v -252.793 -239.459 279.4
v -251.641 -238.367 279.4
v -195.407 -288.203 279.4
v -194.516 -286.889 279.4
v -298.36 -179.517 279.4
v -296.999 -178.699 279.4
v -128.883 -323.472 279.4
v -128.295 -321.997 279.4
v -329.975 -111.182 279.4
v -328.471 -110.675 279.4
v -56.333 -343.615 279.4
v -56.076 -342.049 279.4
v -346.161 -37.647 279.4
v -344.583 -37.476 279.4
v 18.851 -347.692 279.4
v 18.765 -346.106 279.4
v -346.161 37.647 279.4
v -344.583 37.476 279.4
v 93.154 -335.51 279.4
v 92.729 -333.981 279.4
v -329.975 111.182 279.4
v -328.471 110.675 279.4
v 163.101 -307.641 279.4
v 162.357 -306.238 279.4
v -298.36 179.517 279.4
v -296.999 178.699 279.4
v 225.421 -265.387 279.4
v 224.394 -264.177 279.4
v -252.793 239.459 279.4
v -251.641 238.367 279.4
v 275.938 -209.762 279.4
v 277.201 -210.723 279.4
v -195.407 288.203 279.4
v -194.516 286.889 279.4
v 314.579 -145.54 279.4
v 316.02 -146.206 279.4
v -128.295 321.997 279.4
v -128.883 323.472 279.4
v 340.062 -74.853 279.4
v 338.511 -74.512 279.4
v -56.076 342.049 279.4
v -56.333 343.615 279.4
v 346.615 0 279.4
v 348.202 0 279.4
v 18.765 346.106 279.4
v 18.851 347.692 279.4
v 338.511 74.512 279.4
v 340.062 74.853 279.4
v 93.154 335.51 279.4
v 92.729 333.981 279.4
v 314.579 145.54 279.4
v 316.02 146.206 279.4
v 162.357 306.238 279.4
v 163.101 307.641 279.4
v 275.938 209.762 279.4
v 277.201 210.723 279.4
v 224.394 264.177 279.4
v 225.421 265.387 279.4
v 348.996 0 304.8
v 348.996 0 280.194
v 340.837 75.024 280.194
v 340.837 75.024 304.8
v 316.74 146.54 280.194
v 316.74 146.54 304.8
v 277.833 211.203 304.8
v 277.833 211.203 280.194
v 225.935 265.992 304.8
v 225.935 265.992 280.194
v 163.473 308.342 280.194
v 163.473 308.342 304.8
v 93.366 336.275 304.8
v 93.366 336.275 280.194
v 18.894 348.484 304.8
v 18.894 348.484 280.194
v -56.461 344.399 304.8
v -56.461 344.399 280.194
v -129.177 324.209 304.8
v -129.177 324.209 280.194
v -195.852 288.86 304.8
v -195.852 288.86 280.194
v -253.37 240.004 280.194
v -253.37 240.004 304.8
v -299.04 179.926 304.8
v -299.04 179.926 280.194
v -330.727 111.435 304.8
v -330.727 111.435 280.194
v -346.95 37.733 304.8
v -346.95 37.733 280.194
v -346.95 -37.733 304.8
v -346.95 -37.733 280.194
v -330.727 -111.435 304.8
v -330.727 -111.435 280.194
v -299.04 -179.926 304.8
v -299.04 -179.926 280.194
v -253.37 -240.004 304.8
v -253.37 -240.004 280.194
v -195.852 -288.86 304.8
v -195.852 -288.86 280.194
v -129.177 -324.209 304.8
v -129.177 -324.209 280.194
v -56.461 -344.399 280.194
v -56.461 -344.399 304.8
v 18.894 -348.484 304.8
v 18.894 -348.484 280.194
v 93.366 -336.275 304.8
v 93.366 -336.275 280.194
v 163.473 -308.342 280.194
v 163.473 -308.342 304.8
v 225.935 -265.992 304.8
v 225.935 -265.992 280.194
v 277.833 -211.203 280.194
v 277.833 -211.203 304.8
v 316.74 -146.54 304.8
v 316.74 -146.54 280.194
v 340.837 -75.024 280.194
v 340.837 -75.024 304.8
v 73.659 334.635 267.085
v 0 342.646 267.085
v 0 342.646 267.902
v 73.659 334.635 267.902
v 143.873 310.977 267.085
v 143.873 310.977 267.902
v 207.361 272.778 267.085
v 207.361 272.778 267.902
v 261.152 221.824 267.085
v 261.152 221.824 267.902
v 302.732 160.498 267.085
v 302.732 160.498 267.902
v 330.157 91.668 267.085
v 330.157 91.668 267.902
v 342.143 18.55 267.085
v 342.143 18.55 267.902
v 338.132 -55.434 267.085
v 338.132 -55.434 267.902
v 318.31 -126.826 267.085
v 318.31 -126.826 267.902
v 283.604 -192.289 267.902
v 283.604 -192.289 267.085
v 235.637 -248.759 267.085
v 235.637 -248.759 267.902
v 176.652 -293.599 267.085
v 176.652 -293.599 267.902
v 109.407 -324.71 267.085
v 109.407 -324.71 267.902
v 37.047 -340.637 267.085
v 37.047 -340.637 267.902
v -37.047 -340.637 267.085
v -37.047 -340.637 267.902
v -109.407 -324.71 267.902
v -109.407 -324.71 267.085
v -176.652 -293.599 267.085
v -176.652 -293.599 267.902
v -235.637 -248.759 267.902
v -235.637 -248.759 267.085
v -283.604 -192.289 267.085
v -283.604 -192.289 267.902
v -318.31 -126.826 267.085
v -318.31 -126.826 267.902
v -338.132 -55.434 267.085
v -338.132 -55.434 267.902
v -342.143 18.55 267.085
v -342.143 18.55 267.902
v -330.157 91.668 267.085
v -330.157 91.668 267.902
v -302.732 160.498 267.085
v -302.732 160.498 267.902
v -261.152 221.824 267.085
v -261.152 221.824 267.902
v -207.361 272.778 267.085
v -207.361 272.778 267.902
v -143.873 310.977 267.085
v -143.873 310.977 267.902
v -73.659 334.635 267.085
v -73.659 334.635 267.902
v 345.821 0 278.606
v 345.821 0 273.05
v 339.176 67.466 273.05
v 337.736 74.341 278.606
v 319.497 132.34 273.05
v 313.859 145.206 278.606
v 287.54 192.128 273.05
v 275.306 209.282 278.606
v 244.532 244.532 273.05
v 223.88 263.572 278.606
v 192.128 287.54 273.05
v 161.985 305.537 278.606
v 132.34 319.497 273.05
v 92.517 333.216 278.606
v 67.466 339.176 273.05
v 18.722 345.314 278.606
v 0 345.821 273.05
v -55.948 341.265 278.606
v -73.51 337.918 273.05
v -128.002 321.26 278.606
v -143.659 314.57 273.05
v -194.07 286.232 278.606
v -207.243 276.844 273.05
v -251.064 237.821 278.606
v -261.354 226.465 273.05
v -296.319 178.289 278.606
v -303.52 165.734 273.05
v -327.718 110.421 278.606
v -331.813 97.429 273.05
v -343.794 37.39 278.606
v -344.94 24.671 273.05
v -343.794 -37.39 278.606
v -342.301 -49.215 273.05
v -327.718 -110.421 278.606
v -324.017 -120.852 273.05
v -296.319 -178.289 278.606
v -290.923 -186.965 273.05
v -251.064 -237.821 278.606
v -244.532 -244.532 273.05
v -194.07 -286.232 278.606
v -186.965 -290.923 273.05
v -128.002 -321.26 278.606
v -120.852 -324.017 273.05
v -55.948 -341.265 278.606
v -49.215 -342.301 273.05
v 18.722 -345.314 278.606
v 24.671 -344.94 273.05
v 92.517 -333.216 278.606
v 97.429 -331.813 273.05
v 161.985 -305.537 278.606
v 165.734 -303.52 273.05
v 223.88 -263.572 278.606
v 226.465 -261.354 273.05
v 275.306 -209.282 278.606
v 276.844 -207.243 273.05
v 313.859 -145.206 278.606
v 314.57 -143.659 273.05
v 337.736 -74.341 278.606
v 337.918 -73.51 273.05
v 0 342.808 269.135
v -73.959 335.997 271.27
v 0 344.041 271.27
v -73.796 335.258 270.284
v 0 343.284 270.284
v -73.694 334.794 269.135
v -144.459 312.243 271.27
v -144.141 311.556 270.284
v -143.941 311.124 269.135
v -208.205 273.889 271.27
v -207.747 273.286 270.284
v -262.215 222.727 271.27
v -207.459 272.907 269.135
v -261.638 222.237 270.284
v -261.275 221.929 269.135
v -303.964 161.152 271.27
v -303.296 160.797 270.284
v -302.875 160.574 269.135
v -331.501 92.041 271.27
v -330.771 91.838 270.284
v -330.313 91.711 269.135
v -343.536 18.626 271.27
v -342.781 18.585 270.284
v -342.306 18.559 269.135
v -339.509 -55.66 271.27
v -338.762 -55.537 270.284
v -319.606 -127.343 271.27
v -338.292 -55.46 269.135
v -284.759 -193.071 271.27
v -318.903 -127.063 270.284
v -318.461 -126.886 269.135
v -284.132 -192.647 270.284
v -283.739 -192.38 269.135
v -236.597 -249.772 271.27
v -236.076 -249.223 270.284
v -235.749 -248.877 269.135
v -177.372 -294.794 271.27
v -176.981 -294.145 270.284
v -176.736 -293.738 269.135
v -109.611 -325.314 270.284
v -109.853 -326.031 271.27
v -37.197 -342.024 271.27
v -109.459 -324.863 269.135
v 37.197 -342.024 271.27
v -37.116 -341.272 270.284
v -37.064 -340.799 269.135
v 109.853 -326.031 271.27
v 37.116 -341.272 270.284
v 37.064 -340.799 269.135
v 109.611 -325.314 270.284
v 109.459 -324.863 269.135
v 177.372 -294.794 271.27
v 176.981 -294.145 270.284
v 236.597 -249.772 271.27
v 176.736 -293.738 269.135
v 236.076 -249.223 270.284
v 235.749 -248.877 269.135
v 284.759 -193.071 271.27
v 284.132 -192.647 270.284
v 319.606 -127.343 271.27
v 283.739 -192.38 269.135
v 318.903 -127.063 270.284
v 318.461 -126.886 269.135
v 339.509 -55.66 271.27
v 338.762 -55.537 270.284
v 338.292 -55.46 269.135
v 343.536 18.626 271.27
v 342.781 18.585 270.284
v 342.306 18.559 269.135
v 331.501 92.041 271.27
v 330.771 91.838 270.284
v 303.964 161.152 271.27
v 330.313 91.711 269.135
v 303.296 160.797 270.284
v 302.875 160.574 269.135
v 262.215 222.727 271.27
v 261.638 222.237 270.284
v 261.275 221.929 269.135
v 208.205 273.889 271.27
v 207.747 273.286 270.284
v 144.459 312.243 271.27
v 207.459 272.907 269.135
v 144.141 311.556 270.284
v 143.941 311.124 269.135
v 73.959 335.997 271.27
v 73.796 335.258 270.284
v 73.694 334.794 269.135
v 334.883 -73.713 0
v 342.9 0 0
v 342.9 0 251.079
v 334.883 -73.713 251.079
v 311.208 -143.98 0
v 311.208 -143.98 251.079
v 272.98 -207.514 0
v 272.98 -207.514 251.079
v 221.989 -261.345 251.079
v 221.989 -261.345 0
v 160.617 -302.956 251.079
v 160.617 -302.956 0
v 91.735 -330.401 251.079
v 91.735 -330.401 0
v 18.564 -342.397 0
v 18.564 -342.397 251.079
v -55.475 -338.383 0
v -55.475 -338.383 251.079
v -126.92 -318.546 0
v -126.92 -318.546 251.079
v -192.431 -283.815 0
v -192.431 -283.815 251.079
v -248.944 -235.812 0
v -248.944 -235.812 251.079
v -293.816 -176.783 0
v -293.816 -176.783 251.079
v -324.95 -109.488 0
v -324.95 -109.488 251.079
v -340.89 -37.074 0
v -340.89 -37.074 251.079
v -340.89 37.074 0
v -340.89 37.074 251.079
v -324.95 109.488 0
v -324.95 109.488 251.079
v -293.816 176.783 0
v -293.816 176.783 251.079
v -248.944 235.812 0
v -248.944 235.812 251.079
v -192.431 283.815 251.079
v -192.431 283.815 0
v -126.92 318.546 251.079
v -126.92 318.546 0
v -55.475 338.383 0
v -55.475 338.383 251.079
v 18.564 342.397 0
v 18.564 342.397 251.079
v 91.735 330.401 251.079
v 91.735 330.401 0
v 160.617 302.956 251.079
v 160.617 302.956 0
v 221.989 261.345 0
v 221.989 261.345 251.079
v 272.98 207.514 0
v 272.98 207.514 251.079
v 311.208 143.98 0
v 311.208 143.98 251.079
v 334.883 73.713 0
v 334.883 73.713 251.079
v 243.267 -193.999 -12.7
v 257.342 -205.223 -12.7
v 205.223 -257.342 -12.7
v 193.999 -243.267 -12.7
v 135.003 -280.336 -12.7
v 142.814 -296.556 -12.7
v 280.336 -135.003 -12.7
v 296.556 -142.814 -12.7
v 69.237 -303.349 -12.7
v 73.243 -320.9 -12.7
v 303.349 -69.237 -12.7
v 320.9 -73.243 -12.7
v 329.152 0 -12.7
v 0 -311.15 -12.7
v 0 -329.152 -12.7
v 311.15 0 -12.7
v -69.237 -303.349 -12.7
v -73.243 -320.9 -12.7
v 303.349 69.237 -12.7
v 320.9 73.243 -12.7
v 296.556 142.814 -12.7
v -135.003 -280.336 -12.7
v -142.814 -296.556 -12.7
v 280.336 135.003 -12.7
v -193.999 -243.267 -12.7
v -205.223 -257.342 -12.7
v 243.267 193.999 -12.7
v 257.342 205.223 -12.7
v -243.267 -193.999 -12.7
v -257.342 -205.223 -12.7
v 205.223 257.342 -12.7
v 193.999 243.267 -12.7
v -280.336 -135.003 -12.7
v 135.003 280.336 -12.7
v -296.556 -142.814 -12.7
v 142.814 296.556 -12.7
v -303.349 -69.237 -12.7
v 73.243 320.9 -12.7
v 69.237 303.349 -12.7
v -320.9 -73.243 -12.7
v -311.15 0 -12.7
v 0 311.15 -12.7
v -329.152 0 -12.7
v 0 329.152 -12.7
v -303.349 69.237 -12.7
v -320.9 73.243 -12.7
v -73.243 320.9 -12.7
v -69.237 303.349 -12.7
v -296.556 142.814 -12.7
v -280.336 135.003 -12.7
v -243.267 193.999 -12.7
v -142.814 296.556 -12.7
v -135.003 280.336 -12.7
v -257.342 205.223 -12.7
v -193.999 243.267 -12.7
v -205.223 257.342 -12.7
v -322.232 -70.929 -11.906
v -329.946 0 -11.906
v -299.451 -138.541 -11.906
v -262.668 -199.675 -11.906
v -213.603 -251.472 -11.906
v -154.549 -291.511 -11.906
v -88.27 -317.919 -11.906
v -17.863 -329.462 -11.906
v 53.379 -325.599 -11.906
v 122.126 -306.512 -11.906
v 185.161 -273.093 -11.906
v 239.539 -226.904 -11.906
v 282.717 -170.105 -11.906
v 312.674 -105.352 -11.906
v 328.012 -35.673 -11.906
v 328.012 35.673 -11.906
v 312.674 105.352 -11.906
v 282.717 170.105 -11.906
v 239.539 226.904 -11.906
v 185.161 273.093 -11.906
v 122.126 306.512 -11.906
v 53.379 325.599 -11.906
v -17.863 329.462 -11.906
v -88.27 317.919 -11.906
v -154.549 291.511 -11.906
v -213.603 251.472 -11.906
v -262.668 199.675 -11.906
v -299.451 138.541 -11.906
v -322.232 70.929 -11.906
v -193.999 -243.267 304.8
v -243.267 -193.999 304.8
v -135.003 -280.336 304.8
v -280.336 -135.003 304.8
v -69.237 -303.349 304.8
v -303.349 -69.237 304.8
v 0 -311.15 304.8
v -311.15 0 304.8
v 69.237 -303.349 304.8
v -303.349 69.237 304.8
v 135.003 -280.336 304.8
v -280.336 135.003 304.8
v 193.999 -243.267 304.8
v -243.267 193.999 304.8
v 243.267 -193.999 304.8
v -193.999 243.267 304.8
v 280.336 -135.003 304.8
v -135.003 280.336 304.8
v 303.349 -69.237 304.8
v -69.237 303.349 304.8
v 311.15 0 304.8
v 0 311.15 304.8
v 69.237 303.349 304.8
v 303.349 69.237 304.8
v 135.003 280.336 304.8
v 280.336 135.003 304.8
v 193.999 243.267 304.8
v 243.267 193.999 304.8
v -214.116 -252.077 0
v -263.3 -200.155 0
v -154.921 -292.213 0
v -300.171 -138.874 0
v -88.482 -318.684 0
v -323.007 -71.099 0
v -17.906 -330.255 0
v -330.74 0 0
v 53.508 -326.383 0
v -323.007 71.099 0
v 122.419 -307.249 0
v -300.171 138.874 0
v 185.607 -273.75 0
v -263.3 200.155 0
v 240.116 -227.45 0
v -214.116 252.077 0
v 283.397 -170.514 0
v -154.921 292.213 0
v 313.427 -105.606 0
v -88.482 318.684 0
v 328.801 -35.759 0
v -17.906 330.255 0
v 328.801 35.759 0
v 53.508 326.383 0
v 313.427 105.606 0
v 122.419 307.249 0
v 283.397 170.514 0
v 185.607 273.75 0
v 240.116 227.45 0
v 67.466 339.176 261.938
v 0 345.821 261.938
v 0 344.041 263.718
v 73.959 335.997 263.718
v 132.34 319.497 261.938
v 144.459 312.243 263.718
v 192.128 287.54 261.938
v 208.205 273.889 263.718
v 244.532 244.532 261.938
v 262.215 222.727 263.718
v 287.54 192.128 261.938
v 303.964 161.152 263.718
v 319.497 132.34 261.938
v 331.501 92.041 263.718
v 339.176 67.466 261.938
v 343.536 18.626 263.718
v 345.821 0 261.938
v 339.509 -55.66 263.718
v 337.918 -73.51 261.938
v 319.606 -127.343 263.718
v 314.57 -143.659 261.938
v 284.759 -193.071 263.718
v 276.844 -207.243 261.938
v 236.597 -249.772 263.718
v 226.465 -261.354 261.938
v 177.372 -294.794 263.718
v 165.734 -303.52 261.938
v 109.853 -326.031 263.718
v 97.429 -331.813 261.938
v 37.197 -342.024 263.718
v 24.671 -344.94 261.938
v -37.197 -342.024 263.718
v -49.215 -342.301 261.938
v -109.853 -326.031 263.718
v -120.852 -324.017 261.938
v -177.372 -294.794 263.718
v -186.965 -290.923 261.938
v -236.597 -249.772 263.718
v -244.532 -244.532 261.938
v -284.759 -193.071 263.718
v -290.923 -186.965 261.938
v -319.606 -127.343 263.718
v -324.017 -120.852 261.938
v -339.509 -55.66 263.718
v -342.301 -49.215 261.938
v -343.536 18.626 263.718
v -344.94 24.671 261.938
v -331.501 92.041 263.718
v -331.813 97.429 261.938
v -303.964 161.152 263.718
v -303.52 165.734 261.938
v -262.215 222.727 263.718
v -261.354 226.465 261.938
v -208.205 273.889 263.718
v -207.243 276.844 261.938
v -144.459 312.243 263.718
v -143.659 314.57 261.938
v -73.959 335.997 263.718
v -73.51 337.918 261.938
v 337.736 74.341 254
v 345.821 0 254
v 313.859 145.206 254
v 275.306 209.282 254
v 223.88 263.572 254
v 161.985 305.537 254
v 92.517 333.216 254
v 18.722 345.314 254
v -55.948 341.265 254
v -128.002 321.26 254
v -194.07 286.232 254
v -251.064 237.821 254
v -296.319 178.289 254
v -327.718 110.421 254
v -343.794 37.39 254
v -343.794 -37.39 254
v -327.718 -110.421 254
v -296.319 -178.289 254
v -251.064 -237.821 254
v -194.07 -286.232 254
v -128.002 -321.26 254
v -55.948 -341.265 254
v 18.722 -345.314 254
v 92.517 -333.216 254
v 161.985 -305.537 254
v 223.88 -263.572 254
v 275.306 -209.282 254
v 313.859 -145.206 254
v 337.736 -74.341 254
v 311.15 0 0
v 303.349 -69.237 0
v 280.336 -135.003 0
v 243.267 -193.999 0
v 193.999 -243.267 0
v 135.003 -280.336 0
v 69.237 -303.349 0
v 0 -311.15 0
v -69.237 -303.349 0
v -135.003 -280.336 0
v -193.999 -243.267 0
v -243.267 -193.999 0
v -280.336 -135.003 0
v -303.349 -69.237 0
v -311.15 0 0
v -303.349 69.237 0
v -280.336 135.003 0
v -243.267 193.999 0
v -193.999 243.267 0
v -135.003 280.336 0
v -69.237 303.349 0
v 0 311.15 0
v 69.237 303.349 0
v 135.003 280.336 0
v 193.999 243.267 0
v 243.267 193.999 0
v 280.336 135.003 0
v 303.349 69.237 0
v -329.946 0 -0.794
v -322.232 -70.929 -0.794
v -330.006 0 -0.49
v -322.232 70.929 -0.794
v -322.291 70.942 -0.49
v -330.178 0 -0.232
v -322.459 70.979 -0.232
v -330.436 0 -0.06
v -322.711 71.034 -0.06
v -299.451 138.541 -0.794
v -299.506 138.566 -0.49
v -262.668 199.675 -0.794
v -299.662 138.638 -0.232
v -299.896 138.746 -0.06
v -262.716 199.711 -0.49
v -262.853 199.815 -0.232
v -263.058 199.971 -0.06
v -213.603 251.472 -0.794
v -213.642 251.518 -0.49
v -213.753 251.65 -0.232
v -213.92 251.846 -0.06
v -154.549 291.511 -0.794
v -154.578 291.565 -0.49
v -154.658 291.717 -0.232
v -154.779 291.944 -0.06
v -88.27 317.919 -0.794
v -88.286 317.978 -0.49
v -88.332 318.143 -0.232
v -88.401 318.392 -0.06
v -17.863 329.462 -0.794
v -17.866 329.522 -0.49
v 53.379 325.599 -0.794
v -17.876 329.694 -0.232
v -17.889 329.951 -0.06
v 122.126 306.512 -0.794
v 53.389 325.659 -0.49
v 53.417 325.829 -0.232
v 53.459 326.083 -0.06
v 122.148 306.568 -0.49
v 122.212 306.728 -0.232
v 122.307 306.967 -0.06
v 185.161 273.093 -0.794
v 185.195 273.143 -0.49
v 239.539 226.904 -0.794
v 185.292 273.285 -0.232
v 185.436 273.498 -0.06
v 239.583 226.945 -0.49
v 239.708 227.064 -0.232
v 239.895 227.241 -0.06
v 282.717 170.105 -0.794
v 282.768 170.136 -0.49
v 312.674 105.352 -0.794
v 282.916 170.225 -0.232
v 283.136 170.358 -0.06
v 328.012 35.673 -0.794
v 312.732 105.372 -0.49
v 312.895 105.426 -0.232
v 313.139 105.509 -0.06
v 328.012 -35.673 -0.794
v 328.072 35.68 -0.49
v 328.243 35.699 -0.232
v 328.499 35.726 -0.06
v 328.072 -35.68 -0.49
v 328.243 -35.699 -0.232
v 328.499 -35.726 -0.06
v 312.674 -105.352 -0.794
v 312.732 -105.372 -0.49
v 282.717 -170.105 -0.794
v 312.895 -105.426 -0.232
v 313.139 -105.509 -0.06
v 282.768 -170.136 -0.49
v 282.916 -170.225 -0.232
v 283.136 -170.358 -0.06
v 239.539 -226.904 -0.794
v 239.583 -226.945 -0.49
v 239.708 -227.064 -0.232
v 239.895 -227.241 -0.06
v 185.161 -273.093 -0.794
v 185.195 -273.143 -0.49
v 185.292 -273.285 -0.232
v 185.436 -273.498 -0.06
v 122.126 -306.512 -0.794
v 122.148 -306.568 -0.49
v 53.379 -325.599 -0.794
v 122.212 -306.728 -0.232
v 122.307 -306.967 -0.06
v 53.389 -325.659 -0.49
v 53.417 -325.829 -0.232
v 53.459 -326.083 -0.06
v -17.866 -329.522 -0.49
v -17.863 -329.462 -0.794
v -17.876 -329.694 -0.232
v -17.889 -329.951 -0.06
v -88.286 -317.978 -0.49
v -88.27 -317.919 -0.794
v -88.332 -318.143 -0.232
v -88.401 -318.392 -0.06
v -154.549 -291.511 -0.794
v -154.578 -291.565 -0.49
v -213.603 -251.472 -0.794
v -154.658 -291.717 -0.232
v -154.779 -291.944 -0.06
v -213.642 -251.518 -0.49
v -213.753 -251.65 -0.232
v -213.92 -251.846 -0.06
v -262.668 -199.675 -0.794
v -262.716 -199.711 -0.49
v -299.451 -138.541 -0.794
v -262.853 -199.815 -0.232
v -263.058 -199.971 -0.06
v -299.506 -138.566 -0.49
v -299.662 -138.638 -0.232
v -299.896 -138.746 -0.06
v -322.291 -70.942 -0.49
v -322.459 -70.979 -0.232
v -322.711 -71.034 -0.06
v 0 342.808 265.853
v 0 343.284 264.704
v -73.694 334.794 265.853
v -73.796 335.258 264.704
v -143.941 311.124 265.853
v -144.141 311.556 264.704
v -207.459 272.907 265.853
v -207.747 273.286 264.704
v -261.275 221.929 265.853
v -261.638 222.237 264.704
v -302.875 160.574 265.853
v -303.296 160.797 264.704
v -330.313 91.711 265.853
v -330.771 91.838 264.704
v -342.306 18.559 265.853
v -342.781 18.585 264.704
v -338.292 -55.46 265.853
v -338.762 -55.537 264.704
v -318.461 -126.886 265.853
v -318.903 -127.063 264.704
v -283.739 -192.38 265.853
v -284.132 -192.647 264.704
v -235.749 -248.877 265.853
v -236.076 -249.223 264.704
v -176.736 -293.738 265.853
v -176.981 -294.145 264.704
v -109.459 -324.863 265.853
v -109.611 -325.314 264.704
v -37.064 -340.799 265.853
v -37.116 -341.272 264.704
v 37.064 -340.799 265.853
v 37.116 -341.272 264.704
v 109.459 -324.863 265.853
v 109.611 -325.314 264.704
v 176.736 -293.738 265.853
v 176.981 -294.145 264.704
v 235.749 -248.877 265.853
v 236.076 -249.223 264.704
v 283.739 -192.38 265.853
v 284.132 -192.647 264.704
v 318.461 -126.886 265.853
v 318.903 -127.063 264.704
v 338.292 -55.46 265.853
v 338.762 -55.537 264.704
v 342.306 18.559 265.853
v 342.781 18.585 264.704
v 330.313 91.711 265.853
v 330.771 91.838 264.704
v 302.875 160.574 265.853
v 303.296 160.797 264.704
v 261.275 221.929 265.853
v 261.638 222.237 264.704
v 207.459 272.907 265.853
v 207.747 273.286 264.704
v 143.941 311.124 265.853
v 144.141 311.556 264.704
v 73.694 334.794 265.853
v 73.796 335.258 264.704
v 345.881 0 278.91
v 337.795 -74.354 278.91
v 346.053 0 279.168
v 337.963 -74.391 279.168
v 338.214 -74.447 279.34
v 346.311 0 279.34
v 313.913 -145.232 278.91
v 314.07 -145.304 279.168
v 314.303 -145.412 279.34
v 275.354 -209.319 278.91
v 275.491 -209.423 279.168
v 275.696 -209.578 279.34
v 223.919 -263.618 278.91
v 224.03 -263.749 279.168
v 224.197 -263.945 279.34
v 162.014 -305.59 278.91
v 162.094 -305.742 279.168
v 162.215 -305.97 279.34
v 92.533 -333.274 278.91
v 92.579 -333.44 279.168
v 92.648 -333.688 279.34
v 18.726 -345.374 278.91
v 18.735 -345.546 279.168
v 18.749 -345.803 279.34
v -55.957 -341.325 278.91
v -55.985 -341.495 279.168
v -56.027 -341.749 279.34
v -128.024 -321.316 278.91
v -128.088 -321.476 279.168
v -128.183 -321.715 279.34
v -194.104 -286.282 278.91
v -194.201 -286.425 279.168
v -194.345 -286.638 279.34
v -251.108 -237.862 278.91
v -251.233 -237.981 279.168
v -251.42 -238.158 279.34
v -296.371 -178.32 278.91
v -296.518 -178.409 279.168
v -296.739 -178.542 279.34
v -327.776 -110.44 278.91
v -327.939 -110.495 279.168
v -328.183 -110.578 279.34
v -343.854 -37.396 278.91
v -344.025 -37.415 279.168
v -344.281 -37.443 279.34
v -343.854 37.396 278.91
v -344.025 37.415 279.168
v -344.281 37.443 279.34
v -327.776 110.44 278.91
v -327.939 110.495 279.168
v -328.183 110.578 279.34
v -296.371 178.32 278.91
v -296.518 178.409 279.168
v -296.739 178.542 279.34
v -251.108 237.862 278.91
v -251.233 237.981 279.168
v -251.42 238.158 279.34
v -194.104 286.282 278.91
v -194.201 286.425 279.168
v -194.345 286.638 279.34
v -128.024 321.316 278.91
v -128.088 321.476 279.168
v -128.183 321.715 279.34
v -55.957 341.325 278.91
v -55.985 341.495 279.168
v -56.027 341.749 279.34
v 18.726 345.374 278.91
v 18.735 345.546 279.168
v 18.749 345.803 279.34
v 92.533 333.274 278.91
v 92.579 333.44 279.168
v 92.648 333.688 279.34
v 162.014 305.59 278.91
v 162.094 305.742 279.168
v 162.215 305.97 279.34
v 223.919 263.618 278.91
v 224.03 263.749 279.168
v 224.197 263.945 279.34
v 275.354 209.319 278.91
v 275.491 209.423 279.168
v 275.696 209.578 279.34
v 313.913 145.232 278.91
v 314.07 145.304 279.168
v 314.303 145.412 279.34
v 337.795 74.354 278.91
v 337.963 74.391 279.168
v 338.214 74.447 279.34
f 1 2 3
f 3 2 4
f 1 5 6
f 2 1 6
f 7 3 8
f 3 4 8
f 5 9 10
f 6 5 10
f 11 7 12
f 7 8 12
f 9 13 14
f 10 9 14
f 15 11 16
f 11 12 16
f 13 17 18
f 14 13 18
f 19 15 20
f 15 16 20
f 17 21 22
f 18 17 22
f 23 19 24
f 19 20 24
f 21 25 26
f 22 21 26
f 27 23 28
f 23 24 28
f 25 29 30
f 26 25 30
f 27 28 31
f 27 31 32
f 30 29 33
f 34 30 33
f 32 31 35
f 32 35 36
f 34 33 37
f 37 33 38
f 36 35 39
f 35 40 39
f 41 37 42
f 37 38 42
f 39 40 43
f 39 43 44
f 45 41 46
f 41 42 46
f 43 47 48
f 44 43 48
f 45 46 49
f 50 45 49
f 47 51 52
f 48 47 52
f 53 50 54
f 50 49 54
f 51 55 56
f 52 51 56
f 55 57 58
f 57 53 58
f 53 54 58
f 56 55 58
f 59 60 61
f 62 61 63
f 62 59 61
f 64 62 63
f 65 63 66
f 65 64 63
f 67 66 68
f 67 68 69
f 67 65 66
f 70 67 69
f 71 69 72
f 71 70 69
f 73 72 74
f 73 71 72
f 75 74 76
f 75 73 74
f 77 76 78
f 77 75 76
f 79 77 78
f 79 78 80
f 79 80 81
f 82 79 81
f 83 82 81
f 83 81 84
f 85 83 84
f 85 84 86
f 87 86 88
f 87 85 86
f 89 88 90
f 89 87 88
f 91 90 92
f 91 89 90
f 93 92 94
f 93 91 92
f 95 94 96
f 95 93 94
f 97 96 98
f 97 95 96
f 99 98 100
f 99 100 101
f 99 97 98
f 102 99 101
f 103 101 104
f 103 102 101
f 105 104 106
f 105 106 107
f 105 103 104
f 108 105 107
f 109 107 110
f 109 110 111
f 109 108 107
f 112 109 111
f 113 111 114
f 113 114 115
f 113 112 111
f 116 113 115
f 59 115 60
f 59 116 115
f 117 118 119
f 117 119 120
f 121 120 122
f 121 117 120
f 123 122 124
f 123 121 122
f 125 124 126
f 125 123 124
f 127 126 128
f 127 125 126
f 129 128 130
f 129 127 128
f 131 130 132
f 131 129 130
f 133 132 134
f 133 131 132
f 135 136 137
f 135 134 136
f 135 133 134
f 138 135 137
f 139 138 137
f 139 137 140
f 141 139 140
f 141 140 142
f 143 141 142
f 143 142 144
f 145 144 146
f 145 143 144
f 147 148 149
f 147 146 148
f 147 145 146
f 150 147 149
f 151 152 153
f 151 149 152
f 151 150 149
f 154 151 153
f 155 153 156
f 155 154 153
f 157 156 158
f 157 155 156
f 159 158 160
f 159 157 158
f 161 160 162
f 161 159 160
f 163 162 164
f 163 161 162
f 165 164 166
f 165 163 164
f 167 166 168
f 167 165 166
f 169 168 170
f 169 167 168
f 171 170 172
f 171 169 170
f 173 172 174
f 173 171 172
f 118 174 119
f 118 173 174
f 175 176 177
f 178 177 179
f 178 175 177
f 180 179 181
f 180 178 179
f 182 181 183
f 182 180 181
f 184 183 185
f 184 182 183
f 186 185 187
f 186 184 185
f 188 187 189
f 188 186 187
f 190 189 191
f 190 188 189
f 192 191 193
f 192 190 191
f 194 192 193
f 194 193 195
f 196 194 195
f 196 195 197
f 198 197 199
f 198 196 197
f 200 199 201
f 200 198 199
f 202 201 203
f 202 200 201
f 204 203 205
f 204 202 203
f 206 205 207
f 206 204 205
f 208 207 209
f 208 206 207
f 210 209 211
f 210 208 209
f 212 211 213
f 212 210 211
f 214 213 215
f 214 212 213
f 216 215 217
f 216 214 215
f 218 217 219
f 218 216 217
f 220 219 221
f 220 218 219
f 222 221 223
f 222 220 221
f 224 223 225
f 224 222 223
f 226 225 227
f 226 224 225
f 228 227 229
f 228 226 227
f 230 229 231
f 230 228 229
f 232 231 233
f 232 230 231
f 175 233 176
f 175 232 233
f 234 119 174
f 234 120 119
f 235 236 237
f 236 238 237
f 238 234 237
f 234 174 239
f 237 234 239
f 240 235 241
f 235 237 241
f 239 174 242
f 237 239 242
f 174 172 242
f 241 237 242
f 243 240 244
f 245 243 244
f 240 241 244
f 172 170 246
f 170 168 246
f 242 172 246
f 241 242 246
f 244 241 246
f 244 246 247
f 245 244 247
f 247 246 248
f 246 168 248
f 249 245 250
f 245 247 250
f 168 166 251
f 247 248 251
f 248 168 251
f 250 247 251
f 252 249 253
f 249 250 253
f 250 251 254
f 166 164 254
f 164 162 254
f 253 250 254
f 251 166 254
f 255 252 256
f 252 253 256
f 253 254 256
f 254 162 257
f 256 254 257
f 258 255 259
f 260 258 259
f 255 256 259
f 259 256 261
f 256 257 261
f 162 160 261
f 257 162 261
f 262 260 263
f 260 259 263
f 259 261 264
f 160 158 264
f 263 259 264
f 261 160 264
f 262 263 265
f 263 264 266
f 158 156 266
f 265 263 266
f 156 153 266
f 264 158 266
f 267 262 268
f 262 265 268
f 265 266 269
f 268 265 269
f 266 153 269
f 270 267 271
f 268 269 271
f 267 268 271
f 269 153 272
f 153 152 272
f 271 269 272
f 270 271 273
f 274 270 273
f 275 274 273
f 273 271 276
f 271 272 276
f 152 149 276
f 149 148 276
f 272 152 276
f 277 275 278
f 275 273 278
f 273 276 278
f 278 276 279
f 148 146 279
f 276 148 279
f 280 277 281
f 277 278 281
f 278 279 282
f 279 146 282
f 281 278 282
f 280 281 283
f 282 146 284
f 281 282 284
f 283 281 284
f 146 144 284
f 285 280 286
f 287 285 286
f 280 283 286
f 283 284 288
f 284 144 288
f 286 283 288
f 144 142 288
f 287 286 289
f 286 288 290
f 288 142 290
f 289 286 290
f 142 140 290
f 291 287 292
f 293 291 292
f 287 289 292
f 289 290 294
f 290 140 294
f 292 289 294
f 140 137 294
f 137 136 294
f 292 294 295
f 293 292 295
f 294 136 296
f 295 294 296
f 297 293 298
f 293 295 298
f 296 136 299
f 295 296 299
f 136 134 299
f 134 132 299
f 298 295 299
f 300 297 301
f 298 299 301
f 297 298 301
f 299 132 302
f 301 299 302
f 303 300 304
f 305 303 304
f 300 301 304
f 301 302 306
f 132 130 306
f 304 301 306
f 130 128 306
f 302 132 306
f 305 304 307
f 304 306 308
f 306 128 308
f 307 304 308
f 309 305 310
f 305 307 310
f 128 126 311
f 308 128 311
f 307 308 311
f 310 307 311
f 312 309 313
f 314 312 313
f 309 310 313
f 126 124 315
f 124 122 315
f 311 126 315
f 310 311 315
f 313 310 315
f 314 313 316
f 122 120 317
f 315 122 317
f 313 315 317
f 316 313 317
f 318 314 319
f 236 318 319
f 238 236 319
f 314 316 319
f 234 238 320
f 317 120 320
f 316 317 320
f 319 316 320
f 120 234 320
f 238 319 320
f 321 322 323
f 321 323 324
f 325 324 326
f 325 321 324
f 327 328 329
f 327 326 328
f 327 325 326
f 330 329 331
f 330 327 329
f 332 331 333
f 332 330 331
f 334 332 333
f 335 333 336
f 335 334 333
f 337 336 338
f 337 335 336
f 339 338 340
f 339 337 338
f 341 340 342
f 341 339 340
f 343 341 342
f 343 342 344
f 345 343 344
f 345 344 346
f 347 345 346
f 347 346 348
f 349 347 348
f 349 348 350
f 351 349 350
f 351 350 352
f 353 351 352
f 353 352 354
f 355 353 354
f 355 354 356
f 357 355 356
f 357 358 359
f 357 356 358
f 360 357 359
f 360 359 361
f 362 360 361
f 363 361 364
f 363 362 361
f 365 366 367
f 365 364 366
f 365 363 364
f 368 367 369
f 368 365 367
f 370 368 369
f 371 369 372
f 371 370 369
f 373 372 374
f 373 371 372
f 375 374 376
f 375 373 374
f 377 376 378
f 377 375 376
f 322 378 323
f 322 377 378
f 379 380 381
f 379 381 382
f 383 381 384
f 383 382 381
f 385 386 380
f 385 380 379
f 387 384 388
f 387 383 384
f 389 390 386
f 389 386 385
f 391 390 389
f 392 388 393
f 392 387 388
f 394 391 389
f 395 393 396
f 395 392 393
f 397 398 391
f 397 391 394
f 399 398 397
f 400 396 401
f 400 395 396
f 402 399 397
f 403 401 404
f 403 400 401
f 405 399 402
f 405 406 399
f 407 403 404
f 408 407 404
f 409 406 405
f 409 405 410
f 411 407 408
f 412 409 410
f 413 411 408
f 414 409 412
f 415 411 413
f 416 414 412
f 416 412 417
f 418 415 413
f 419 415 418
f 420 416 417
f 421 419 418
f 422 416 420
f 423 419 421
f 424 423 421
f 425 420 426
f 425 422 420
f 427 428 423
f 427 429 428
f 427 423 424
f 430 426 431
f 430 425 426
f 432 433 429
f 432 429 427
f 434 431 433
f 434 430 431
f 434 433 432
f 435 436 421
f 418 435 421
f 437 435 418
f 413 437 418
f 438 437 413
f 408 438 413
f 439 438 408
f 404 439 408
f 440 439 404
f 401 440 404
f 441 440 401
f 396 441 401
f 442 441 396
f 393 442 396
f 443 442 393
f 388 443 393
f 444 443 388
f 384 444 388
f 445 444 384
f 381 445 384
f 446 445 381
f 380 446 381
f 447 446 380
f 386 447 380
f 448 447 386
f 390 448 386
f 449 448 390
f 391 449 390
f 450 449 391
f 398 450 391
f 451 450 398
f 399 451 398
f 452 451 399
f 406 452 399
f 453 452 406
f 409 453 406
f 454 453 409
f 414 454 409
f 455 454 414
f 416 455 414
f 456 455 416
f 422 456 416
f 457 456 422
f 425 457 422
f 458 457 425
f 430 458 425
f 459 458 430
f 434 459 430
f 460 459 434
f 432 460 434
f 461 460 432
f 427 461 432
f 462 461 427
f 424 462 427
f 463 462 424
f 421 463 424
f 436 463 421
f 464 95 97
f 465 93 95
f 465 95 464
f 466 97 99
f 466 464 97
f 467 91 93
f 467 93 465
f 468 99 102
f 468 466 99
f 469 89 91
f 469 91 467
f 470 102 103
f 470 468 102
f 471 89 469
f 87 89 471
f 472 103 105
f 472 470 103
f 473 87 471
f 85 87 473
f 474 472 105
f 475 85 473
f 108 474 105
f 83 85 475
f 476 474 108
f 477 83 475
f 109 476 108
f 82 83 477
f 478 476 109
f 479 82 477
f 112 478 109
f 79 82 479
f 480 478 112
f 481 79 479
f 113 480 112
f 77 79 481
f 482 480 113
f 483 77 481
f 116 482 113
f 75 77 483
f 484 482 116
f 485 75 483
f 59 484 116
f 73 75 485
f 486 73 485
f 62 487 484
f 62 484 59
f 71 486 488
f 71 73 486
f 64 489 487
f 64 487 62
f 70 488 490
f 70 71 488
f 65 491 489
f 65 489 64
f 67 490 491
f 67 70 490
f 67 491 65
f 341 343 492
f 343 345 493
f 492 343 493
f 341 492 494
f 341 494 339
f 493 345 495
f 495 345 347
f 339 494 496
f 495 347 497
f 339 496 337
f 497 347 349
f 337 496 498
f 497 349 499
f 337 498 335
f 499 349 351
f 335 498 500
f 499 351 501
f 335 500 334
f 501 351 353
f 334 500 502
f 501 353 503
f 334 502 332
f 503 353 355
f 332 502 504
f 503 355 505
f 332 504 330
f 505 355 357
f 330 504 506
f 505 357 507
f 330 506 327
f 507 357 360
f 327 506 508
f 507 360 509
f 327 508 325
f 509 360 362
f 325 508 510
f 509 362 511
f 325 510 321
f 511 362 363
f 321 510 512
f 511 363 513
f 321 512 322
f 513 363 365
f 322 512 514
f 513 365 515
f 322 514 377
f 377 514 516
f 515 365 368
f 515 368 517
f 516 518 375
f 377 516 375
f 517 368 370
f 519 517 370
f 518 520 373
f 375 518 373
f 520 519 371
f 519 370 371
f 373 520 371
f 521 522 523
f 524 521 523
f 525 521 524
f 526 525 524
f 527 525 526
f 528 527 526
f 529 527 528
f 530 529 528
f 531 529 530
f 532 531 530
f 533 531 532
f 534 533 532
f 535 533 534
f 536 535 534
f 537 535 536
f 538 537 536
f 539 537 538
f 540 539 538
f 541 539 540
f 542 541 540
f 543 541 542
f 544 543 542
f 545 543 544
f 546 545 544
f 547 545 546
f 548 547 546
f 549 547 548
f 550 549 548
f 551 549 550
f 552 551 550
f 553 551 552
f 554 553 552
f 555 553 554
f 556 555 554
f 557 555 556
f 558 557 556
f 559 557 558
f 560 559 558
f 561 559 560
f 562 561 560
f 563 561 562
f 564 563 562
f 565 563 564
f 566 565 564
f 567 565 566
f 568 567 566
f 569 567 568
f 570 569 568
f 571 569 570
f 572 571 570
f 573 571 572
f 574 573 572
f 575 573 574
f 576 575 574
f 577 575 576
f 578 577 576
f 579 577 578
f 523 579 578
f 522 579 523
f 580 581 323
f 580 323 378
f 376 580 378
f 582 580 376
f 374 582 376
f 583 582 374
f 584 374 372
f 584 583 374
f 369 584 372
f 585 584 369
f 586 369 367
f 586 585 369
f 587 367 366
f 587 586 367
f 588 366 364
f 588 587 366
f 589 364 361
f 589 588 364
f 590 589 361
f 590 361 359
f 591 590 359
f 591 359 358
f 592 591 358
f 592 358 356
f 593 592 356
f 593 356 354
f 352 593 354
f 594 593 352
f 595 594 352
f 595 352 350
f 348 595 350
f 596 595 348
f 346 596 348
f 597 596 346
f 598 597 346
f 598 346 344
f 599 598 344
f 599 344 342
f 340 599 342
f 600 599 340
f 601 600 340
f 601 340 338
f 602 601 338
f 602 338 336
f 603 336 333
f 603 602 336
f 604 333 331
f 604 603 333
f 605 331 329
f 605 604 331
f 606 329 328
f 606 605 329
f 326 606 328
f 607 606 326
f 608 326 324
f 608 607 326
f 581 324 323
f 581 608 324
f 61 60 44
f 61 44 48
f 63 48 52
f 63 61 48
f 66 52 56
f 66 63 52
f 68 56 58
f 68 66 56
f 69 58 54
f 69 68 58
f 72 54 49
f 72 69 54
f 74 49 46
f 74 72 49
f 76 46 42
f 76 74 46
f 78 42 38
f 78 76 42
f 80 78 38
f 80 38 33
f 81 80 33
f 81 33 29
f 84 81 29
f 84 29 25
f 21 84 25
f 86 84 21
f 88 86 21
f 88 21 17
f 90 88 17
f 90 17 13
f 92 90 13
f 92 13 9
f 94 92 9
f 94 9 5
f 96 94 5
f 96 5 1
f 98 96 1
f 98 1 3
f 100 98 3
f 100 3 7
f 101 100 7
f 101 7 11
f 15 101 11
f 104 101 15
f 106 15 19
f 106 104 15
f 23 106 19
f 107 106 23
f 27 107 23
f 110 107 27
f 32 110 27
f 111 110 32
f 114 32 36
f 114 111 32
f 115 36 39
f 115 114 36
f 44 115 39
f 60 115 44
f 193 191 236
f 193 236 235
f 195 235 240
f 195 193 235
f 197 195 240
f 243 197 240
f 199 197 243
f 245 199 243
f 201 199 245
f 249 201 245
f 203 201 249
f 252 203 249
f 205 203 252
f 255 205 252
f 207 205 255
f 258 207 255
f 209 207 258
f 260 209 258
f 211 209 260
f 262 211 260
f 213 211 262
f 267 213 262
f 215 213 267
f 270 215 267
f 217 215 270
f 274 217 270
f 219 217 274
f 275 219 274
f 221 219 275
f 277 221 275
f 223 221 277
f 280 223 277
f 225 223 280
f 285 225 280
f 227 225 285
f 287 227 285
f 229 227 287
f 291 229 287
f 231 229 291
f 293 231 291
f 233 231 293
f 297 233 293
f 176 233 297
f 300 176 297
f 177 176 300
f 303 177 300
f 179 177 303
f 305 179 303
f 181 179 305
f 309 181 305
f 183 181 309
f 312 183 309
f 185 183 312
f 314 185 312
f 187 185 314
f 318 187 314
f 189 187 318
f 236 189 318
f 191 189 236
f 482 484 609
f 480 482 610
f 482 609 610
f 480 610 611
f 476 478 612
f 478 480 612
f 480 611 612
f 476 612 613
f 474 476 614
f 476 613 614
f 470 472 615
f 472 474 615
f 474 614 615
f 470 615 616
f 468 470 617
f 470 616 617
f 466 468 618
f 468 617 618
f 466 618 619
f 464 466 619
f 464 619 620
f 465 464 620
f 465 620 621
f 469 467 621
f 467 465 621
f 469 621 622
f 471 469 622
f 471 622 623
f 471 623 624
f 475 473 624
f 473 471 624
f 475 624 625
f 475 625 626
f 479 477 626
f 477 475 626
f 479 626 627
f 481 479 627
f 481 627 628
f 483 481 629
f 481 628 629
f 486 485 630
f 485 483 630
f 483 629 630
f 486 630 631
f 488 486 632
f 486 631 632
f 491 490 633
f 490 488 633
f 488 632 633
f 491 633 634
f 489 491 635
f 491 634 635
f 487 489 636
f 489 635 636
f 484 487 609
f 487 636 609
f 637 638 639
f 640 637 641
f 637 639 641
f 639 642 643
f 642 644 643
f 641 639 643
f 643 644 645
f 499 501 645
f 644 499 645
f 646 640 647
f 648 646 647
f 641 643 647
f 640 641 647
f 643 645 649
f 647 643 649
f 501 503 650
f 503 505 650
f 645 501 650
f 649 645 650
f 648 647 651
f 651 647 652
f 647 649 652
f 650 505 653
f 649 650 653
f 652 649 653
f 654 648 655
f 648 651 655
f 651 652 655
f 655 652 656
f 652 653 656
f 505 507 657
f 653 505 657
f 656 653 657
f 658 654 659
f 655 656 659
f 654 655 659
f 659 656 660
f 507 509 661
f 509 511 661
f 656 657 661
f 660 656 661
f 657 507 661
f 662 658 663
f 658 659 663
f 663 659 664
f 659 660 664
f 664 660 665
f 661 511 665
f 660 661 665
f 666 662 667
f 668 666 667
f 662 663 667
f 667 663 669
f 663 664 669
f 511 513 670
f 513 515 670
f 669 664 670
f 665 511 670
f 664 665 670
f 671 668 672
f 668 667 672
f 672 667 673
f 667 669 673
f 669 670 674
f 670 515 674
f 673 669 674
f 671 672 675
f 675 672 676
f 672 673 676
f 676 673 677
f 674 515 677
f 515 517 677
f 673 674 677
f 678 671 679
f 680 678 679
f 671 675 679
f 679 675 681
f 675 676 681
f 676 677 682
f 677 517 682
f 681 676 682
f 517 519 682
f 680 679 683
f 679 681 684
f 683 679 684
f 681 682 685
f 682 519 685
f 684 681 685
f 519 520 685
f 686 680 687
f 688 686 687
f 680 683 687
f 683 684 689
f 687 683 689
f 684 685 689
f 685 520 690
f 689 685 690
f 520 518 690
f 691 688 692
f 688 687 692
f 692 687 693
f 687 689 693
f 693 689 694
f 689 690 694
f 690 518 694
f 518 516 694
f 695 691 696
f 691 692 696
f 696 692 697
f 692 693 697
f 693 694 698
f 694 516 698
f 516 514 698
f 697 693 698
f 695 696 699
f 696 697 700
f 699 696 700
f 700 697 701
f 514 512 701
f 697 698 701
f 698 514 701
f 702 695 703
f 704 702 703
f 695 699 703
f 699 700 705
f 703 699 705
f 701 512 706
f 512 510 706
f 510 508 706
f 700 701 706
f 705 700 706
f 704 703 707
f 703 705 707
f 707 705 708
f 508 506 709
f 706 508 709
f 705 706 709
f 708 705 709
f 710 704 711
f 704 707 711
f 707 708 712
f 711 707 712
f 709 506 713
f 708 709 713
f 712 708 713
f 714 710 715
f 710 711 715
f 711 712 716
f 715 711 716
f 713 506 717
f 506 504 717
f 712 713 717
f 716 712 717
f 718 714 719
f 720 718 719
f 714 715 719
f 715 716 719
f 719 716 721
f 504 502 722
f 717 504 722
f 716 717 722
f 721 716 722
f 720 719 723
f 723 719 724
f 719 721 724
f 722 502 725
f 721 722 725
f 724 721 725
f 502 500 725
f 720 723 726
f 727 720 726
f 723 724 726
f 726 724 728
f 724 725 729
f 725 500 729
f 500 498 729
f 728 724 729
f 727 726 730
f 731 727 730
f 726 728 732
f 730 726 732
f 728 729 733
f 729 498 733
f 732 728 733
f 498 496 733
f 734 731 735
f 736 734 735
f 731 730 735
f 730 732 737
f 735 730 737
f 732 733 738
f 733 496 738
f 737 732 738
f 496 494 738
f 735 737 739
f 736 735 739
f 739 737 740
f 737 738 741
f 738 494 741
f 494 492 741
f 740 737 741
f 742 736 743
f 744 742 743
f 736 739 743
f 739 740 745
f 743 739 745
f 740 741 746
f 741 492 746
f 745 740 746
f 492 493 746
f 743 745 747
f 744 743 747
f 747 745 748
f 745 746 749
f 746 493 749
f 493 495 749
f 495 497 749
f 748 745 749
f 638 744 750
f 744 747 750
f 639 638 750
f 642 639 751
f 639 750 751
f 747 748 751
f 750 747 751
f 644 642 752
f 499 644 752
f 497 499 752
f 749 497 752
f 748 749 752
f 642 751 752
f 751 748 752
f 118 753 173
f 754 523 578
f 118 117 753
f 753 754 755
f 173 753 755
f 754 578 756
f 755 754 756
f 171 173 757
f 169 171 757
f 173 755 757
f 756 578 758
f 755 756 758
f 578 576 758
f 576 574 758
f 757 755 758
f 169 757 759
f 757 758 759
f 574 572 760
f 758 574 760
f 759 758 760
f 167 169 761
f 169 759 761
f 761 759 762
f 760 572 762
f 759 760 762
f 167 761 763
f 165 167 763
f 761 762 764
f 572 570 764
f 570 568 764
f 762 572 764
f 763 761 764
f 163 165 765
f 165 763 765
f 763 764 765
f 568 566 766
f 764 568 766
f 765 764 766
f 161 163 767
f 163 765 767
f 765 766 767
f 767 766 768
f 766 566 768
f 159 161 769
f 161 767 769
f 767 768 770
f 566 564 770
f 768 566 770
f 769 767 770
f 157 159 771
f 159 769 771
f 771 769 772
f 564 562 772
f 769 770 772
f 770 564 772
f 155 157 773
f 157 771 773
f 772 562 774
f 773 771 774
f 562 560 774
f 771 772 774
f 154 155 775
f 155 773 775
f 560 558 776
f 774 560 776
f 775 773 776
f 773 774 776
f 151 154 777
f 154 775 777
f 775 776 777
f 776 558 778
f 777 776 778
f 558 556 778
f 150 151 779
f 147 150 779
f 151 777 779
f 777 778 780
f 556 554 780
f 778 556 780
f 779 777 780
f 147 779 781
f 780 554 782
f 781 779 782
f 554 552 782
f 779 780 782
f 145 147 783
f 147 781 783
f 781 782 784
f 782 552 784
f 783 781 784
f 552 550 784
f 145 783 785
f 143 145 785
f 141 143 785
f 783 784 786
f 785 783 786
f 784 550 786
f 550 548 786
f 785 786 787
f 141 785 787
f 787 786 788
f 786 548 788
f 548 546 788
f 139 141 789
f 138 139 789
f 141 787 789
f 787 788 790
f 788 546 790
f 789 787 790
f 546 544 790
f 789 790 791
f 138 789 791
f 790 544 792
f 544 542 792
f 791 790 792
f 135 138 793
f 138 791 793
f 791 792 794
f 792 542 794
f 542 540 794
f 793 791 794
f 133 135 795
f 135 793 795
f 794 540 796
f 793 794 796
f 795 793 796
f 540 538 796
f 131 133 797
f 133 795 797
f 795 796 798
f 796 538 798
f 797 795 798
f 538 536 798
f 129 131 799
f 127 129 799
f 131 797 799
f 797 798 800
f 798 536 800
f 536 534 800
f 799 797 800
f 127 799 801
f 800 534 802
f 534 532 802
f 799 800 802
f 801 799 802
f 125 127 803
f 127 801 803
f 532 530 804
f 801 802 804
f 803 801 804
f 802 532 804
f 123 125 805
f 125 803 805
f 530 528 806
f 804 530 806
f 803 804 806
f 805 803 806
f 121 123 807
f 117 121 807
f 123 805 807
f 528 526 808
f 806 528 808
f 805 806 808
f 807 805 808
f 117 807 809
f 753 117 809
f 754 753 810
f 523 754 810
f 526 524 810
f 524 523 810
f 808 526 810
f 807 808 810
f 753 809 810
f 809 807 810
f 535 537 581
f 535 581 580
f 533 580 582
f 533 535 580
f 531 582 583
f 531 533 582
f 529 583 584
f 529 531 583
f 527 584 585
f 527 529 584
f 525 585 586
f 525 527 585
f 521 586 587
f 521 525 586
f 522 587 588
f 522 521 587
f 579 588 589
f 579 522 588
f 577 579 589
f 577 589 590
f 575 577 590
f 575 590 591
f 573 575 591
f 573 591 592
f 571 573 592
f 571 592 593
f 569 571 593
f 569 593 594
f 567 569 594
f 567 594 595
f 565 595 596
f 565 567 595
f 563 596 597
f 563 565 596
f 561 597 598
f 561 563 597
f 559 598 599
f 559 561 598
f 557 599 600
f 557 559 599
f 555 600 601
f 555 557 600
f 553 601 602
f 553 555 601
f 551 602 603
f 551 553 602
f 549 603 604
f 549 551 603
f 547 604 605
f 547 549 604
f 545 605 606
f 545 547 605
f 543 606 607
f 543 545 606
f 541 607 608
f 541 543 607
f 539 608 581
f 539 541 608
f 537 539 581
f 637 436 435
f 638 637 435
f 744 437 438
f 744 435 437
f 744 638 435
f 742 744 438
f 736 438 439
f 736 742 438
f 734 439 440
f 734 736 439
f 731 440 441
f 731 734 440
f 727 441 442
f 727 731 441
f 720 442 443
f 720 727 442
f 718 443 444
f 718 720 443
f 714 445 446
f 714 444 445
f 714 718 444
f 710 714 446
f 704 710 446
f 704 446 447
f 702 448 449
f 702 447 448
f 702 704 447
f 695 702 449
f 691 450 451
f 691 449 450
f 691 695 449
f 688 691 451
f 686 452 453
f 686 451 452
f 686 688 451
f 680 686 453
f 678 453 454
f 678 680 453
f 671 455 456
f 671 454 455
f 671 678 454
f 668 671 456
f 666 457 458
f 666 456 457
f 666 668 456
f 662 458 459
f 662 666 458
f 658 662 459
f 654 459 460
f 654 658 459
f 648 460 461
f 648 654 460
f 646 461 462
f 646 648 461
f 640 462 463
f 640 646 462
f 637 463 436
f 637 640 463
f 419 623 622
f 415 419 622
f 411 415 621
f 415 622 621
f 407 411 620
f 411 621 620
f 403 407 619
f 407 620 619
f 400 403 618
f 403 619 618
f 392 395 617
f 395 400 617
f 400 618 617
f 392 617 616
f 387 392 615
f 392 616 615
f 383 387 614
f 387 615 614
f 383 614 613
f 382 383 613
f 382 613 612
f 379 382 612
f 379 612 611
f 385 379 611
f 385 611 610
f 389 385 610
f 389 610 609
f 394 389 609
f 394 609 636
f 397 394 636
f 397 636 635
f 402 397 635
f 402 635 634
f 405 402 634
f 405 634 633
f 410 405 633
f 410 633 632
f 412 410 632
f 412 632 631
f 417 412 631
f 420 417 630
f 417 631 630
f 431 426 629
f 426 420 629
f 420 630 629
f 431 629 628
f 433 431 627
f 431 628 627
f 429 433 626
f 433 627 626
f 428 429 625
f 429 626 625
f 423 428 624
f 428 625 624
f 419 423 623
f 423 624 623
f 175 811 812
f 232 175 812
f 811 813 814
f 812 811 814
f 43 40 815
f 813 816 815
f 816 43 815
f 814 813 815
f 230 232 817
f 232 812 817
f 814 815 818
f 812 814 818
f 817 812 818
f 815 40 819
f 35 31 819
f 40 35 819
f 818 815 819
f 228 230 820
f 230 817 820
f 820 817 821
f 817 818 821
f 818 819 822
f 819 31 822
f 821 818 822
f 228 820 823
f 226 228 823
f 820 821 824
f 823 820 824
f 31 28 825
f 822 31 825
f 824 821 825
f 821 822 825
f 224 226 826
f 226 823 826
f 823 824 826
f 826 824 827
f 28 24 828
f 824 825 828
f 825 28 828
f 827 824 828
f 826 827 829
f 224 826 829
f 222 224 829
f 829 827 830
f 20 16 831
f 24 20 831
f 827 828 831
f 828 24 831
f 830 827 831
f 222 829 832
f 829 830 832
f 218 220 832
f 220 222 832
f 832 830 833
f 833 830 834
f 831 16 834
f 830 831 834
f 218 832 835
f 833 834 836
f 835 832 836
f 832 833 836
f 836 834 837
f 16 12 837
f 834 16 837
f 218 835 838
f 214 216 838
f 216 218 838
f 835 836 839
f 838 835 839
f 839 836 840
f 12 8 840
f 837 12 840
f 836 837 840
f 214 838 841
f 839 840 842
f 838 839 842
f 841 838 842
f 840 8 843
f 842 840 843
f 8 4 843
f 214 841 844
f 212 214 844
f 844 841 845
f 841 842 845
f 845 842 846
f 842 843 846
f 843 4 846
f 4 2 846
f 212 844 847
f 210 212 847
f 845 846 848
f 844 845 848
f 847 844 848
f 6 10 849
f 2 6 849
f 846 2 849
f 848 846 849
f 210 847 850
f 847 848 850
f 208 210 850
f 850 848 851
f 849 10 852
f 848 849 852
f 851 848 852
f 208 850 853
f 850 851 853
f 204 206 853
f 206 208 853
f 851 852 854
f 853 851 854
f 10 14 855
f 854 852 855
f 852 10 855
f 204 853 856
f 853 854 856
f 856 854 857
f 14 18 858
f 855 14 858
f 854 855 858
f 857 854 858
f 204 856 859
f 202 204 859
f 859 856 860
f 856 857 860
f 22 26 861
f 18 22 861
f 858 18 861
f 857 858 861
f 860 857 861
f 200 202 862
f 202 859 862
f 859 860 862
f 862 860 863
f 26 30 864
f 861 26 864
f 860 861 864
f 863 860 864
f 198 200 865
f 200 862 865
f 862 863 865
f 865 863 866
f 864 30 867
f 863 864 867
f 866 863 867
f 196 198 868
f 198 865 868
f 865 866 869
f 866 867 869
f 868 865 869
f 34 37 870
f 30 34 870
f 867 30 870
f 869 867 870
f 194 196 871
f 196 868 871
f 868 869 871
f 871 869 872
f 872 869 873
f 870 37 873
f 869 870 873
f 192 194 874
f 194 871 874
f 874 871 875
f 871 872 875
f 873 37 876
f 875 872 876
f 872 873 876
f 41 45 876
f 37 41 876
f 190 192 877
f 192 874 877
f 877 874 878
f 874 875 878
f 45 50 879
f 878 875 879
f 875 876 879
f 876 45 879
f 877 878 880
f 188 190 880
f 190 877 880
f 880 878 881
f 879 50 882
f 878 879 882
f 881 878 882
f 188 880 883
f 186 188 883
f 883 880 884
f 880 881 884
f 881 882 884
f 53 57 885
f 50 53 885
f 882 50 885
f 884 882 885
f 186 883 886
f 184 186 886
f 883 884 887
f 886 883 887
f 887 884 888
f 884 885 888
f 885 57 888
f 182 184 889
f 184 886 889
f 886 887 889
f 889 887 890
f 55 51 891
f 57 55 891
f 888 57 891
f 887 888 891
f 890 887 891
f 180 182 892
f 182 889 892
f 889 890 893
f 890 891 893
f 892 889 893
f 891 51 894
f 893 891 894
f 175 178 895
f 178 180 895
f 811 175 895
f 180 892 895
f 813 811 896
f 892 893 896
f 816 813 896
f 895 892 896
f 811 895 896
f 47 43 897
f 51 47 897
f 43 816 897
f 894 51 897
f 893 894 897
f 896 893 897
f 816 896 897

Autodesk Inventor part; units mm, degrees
ref_plane "YZ Plane" through (0, 0, 0) normal (1, 0, 0) x (0, 1, 0)
ref_plane "XZ Plane" through (0, 0, 0) normal (0, 1, 0) x (-1, 0, 0)
ref_plane "XY Plane" through (0, 0, 0) normal (0, 0, 1) x (1, 0, 0)
sketch "Sketch1" plane through (0, 0, 0) normal (0, 0, 1) x (1, 0, 0)
  circle A0 centre (0, 0) radius 311.15
  circle A1 centre (0, 0) radius 342.9
  dimension "d0" = 622.3
  dimension "d1" = 685.8
extrude "Extrusion1" add sketch "Sketch1" along normal blind 304.8
sketch "Sketch2" plane through (0, 0, 304.8) normal (0, 0, 1) x (1, 0, 0)
  circle A0 centre (0, 0) radius 342.9 projected
  circle A1 centre (0, 0) radius 345.821
  circle A2 centre (0, 0) radius 348.996
  dimension "d4" = 691.642
  dimension "d5" = 697.992
extrude "Extrusion2" add sketch "Sketch2" against normal blind 50.8 contours A1
extrude "Extrusion3" add sketch "Sketch2" against normal blind 25.4 contours A2
chamfer "Chamfer1" distance 2.921 angle 45 1 edges at (-342.9, 0, 254)
sketch "Sketch3" plane through (0, 0, 0) normal (0, 0, -1) x (-1, 0, 0)
  circle A0 centre (0, 0) radius 329.946
  circle A1 centre (0, 0) radius 311.15 projected
  dimension "d13" = 659.892
extrude "Extrusion4" add sketch "Sketch3" along normal blind 12.7
fillet "Fillet1" radius 0.7937 2 edges at (329.946, 0, 0) (-345.821, 0, 279.4)
chamfer "Chamfer2" distance 0.7937 angle 45 1 edges at (329.946, 0, -12.7)
chamfer "Chamfer3" distance 0.7937 angle 45 1 edges at (-348.996, 0, 279.4)
sketch "Sketch4" plane through (0, 0, 0) normal (1, 0, 0) x (0, 1, 0)
  line L0 (345.821, 278.6062) -> (345.821, 254) construction
  line L1 (-348.996, 304.8) -> (348.996, 304.8) construction
  line L2 (345.821, 273.05) -> (344.0409, 271.2699)
  arc A0 (344.0409, 271.2699) -> (342.646, 267.9023) centre (347.4085, 267.9023) ccw
  line L3 (342.646, 267.9023) -> (342.646, 267.0852)
  arc A1 (342.646, 267.0852) -> (344.0409, 263.7176) centre (347.4085, 267.0852) ccw
  line L4 (344.0409, 263.7176) -> (345.821, 261.9375)
  line L5 (345.821, 261.9375) -> (345.821, 273.05)
  line L6 (0, -60.96) -> (0, 365.76) projected
  point P0 (0, 0)
  dimension "d23" = 11.1125
  dimension "d24" = 3.175
  dimension "d25" = 4.7625
  dimension "d26" = 31.75
  dimension "d27" = 45
revolve "Revolution1" cut sketch "Sketch4" angle 360 about axis through (0, 0, -10) along (0, 0, 1)
equation "\"d10\" = -0.5 * d1 + 0.5 * d4"
properties part number "A1-19037-300-06 HCWI liner - pup" material "Iron, HCWI"
